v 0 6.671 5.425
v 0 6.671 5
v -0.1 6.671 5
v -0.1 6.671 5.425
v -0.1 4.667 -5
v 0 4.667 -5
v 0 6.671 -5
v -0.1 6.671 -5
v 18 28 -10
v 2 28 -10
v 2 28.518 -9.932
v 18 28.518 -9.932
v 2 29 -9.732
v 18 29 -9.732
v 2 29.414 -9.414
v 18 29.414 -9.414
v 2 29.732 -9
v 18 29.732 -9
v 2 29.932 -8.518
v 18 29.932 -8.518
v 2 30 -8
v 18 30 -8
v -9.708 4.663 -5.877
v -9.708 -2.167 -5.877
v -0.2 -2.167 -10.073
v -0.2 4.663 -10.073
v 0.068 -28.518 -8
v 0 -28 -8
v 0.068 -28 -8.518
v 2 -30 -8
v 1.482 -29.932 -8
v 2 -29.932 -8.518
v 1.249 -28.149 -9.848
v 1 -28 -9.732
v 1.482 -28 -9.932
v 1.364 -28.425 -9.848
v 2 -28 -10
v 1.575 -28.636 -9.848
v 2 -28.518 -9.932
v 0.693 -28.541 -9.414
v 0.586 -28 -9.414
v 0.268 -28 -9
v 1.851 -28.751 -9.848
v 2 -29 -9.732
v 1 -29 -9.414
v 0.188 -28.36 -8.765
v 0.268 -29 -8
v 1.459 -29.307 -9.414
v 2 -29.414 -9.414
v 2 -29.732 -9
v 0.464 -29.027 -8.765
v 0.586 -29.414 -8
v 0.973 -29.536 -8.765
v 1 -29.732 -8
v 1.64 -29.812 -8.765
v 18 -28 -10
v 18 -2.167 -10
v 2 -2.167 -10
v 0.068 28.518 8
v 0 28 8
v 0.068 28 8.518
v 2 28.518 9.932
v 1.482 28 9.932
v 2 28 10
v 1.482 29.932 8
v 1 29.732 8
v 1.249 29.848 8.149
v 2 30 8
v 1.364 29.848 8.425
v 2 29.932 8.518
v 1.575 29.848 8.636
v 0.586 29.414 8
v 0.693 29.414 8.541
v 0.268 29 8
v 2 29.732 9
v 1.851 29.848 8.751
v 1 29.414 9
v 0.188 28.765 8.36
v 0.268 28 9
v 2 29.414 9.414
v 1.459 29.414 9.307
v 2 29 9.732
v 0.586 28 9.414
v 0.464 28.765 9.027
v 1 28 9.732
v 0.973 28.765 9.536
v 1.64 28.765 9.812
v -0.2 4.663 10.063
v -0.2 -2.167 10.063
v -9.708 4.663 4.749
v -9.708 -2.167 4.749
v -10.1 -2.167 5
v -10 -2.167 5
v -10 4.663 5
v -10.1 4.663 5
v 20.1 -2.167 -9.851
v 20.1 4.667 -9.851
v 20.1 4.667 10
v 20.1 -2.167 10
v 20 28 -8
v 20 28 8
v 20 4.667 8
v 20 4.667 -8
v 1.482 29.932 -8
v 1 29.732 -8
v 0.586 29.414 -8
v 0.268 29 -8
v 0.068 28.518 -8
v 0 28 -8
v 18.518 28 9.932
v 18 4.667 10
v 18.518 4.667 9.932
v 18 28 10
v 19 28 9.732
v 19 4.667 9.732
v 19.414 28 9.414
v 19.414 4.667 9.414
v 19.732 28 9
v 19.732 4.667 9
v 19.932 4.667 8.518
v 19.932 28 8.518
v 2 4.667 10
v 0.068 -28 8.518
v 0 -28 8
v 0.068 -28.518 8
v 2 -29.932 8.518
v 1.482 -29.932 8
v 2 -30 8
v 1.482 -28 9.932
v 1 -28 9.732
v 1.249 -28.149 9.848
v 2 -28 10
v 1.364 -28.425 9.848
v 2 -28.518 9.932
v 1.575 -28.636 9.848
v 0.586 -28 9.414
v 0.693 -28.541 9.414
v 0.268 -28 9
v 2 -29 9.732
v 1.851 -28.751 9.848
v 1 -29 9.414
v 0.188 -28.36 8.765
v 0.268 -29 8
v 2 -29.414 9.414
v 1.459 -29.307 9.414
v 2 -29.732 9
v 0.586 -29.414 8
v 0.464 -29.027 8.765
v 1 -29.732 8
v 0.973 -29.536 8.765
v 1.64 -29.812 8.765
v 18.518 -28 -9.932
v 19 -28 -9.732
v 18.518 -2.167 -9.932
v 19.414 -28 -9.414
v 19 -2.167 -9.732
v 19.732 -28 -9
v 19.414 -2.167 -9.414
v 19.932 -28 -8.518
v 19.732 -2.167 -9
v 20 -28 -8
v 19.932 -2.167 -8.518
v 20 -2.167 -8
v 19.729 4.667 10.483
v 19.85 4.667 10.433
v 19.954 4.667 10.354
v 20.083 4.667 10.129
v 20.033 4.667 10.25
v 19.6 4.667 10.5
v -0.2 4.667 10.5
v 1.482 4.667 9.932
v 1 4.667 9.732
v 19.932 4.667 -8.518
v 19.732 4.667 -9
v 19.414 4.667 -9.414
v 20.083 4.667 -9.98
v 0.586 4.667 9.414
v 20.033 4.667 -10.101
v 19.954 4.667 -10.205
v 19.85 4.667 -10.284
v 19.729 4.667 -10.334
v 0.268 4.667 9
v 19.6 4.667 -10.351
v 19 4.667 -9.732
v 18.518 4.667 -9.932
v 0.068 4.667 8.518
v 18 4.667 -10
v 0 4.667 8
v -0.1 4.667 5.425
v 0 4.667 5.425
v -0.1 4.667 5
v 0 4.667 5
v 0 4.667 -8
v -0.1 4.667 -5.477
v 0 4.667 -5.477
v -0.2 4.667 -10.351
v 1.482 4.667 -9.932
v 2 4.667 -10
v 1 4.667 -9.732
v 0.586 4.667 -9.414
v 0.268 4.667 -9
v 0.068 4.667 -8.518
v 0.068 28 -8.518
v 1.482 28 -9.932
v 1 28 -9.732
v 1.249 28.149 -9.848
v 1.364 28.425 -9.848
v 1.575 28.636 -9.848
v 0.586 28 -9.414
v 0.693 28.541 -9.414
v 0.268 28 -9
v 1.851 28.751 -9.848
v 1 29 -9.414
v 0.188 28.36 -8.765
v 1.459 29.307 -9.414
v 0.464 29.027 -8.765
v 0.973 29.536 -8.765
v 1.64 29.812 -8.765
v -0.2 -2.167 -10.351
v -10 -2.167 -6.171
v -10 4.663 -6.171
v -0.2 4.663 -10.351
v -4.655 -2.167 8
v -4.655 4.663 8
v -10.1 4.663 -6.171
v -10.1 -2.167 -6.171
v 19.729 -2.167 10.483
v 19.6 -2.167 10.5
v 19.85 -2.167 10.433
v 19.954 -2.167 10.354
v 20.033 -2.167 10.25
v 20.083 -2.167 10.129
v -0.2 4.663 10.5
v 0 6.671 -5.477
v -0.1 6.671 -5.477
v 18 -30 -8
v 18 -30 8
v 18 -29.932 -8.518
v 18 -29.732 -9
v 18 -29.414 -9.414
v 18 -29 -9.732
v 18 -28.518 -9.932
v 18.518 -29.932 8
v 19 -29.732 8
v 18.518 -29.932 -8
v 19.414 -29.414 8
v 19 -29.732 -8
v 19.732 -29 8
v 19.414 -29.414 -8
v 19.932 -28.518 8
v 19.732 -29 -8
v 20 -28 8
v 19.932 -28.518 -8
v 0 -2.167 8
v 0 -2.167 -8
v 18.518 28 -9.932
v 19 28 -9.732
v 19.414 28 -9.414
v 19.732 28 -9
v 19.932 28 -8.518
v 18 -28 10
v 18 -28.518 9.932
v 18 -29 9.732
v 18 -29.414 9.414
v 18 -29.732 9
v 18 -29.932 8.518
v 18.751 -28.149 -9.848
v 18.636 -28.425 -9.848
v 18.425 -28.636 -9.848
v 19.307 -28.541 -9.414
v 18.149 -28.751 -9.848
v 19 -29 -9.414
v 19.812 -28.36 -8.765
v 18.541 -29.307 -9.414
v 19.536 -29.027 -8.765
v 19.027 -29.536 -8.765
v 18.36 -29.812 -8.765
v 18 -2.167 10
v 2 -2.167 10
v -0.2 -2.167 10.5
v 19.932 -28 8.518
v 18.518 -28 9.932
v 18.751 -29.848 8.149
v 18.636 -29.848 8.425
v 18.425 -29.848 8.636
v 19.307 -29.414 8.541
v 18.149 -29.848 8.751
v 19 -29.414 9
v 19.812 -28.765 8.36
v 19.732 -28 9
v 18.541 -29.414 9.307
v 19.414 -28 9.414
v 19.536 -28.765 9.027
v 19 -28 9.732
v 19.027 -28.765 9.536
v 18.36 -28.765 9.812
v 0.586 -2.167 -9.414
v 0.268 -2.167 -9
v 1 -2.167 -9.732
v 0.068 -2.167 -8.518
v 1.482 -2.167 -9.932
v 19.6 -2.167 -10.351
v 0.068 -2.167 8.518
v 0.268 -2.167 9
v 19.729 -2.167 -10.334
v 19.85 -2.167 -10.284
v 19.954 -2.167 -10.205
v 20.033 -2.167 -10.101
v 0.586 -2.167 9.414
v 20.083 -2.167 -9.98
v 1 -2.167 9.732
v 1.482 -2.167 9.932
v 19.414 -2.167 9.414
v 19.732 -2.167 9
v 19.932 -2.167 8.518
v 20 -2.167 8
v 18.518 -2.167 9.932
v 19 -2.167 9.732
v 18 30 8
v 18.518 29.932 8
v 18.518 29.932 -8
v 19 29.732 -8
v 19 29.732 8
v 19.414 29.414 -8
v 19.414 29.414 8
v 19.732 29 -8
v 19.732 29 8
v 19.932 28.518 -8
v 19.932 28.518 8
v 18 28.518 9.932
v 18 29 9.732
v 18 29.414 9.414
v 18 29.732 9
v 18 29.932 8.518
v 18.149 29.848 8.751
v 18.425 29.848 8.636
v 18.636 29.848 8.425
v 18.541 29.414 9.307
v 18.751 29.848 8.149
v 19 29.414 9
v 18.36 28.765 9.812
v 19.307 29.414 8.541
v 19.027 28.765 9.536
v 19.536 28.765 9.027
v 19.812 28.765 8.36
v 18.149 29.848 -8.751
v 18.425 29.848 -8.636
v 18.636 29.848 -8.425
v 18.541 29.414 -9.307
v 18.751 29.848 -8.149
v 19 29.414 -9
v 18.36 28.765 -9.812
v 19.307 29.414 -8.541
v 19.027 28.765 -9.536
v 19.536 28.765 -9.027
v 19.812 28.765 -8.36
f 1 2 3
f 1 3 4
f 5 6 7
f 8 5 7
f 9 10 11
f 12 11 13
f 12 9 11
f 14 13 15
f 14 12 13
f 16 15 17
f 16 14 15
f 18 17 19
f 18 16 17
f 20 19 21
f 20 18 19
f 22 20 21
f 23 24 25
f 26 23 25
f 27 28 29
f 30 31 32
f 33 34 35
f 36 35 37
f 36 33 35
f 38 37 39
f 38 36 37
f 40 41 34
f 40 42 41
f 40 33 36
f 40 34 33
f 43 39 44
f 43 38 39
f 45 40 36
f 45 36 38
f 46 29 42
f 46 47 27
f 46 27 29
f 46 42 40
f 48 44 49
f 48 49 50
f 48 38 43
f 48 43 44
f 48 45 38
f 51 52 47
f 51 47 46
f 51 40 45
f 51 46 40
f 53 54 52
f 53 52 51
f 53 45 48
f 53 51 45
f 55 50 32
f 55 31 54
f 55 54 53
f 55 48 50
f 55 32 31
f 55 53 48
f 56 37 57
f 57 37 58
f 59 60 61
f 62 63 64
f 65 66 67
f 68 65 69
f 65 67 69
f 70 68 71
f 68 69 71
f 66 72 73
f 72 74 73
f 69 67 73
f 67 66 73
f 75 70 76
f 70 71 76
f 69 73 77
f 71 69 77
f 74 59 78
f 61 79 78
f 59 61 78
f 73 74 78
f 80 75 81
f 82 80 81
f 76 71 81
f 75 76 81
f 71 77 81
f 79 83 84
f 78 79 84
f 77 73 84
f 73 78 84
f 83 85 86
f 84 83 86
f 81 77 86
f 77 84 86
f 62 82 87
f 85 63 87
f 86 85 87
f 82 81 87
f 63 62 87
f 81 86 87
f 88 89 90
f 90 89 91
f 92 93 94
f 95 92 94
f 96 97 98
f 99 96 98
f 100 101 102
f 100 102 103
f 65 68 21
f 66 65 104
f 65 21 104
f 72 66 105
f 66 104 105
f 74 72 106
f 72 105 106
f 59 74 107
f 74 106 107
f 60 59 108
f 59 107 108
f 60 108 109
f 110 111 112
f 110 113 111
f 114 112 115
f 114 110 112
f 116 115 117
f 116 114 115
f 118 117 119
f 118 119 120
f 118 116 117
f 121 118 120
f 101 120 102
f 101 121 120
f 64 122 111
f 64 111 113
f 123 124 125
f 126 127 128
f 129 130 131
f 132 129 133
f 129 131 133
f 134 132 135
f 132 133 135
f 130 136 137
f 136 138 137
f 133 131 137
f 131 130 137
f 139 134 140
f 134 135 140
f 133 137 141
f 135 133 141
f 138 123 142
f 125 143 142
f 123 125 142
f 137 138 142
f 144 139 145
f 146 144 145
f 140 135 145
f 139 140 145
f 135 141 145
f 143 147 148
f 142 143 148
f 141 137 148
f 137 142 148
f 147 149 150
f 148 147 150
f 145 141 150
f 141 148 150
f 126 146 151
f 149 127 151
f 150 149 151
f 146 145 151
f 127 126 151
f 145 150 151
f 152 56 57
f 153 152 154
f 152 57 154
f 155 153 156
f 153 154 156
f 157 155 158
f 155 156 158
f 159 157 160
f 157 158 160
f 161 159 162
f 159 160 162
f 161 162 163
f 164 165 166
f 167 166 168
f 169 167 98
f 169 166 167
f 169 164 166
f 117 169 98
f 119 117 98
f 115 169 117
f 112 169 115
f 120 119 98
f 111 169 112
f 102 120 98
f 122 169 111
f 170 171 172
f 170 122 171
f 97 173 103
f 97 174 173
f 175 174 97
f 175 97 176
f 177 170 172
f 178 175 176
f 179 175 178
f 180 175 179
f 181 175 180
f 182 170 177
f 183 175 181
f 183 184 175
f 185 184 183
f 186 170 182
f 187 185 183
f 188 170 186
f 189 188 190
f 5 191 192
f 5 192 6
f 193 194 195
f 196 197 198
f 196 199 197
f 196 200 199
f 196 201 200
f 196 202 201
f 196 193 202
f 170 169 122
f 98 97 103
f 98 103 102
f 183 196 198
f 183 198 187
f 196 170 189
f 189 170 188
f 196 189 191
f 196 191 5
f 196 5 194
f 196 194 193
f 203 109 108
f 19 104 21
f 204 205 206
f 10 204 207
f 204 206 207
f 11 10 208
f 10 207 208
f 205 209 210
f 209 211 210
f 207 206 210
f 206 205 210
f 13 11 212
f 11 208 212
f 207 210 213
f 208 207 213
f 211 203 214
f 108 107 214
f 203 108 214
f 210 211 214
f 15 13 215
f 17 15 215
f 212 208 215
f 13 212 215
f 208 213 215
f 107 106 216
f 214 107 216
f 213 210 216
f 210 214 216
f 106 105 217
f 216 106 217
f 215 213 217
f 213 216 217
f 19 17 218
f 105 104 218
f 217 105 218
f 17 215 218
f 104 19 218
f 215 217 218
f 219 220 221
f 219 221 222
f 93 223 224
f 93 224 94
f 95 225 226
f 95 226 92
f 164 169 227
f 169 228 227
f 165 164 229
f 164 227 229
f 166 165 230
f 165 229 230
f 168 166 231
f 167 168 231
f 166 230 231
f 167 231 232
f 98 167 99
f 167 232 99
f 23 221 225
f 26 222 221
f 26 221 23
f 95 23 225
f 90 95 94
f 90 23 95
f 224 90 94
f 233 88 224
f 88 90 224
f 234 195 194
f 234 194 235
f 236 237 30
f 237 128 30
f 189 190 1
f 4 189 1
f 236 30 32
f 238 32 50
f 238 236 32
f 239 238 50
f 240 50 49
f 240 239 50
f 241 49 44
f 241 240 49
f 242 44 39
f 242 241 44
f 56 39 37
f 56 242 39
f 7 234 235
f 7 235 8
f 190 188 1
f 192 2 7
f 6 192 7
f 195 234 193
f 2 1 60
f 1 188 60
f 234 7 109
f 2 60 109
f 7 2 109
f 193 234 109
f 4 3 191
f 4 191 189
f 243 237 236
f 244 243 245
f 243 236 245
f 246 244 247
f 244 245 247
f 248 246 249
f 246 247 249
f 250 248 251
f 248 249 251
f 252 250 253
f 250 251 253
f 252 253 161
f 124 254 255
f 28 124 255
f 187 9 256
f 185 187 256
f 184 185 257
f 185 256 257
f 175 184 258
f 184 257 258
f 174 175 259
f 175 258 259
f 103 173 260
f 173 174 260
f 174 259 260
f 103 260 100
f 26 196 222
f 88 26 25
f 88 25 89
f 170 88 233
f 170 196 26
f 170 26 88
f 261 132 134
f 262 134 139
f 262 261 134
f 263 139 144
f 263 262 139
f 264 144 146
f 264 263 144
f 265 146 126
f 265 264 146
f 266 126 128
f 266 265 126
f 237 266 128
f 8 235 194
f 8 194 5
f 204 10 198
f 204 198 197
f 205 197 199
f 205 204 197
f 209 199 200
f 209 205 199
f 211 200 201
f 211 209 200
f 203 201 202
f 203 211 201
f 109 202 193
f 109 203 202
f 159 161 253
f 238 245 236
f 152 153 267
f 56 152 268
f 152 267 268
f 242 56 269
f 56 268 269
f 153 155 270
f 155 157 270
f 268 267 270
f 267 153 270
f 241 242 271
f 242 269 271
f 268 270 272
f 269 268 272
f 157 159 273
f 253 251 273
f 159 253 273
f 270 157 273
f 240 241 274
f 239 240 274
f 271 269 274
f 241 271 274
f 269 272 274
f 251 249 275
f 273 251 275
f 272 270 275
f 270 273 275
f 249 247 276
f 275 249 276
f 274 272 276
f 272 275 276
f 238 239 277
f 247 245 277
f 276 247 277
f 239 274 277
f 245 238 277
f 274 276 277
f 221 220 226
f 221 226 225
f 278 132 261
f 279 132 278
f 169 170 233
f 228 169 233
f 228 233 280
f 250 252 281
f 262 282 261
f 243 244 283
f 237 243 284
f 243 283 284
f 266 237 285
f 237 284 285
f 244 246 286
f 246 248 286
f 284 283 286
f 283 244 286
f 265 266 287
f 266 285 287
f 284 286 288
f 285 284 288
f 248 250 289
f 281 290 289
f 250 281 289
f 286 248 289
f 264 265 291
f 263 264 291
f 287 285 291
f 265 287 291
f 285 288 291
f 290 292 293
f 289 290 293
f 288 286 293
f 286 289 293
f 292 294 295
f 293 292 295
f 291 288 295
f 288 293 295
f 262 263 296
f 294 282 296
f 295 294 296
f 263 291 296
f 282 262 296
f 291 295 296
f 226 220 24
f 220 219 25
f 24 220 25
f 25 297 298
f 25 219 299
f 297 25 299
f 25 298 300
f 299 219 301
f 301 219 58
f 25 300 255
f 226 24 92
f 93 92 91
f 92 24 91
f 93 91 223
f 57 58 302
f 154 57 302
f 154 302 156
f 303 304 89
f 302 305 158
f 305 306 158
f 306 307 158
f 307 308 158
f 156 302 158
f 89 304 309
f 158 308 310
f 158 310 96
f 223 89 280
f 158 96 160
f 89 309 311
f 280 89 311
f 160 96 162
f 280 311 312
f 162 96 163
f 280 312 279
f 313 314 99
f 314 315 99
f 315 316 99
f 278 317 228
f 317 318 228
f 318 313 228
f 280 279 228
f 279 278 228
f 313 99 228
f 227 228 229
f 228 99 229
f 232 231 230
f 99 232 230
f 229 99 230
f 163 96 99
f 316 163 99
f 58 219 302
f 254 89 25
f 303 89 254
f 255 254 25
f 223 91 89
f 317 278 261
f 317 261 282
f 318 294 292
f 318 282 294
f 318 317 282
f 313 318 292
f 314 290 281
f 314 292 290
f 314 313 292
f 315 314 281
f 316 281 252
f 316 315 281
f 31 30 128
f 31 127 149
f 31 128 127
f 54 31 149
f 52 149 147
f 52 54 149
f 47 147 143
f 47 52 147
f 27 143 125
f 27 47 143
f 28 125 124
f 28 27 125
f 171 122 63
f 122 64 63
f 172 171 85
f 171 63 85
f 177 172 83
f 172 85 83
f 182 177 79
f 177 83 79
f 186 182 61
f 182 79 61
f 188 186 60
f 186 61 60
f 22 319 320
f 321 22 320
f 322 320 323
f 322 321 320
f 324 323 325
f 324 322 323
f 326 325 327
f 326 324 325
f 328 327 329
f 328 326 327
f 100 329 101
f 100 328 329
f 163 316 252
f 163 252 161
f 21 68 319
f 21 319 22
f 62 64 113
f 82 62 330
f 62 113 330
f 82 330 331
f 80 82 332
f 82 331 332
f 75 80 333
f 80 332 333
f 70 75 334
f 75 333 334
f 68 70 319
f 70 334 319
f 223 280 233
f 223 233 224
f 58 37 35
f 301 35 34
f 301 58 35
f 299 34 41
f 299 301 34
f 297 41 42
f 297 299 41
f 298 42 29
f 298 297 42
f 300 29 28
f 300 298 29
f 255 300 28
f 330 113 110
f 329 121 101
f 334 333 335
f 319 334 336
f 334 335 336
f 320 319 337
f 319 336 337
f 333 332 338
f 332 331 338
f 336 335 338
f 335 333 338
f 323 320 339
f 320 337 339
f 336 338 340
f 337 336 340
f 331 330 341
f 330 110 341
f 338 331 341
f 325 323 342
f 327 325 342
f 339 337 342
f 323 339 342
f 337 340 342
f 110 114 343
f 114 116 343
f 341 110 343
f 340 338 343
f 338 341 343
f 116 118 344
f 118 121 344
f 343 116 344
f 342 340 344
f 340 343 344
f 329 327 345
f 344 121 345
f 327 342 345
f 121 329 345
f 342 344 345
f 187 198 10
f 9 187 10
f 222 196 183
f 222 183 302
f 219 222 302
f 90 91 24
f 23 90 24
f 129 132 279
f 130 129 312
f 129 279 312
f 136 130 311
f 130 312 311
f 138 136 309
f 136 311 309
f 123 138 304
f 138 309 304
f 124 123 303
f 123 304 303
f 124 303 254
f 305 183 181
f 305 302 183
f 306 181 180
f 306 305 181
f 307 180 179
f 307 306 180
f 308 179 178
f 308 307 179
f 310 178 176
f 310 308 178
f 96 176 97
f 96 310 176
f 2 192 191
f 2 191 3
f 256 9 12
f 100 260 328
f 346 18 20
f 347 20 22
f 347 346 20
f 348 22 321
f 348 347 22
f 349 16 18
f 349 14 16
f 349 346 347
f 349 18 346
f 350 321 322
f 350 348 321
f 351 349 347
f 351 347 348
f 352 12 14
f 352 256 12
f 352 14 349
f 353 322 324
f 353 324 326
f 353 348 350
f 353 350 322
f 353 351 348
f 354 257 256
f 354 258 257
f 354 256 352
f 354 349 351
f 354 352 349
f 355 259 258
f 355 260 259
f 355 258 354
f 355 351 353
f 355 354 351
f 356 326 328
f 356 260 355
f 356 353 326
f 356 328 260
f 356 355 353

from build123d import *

# Parameters (mm, degrees)
SKETCH_1_W           = 20
SKETCH_1_H           = 60
EXTRUDE_1_DEPTH      = 20
FILLET_1_R           = 2
SKETCH_2_W           = 16
SKETCH_2_H           = 1.155895232
EXTRUDE_2_DEPTH      = 0.5
EXTRUDE_3_DEPTH      = 2.1
EXTRUDE_3_DEPTH_BACK = 18.2
SKETCH_4_W           = 0.476897723
SKETCH_4_H           = 2.004187554
SKETCH_4_W_2         = 0.424555406
EXTRUDE_4_DEPTH      = 0.1
EXTRUDE_5_DEPTH      = 6.83
CUT_EXTRUDE_1_DEPTH  = 6.83
SKETCH_7_W           = 11.171140339
SKETCH_7_H           = 6.83
EXTRUDE_6_DEPTH      = 0.1
FILLET_5_R           = 0.5


with BuildPart() as part:
    # 草图1 → 凸台-拉伸1 (new body)
    with BuildSketch(Plane(origin=(0, 0, 0), x_dir=(0, 0, -1), z_dir=(1, 0, 0))):
        Rectangle(SKETCH_1_W, SKETCH_1_H)
    extrude(amount=EXTRUDE_1_DEPTH)

    # 圆角1
    fillet_1_edges = [part.edges().sort_by_distance(p)[0] for p in [
        (20, 0, 10),
        (20, -30, 0),
        (20, 0, -10),
        (0, -30, 0),
        (0, 0, 10),
        (0, 30, 0),
        (0, 0, -10),
        (10, -30, -10),
        (10, -30, 10),
        (10, 30, 10),
        (10, 30, -10),
        (20, 30, 0),
    ]]
    fillet(fillet_1_edges, radius=FILLET_1_R)

    # 草图2 → 凸台-拉伸2 (add)
    with BuildSketch(Plane.XY.offset(10)):
        with Locations((10, 0.577947616)):
            Rectangle(SKETCH_2_W, SKETCH_2_H)
    extrude(amount=EXTRUDE_2_DEPTH)

    # 草图3 → 凸台-拉伸3 (add, two sides: drawn at the far end of the back side and taken through both)
    with BuildSketch(Plane(origin=(18, 0, 0), x_dir=(0, 0, -1), z_dir=(1, 0, 0)).offset(-EXTRUDE_3_DEPTH_BACK)):
        Polygon((-10.5, 1.155895232), (-10.5, 4.667192464), (10.350971517, 4.667192464), (10.350971517, -2.166522321), (-10.5, -2.166522321), align=None)
    extrude(amount=EXTRUDE_3_DEPTH + EXTRUDE_3_DEPTH_BACK)

    # 草图4 → 凸台-拉伸4 (add)
    with BuildSketch(Plane.ZY):
        with Locations((-5.238448862, 5.669286241)):
            Rectangle(SKETCH_4_W, SKETCH_4_H)
        with Locations((5.212277703, 5.669286241)):
            Rectangle(SKETCH_4_W_2, SKETCH_4_H)
    extrude(amount=EXTRUDE_4_DEPTH)

    # 草图5 → 凸台-拉伸5 (add)
    with BuildSketch(Plane.XZ.offset(2.166522321)):
        Polygon((-0.2, -10.350971517), (-0.2, 8), (-4.654545455, 8), (-10, 5), (-10, 0), (-10, -6.171140339), align=None)
        Polygon((-4.654545455, 8), (-0.2, 8), (-0.2, 10.5), align=None)
    extrude(amount=-EXTRUDE_5_DEPTH)

    # 草图6 → 切除-拉伸1 (cut)
    with BuildSketch(Plane.XZ.offset(2.166522321)):
        Polygon((-9.707704369, -5.877282194), (-0.2, -10.073184662), (-0.2, 10.062586421), (-9.707704369, 4.749296883), align=None)
    extrude(amount=-CUT_EXTRUDE_1_DEPTH, mode=Mode.SUBTRACT)

    # 草图7 → 凸台-拉伸6 (add)
    with BuildSketch(Plane.ZY.offset(10)):
        with Locations((-0.58557017, 1.248477679)):
            Rectangle(SKETCH_7_W, SKETCH_7_H)
    extrude(amount=EXTRUDE_6_DEPTH)

    # 圆角5
    fillet_5_edges = [part.edges().sort_by_distance(p)[0] for p in [
        (20.1, 1.250335071, 10.5),
        (20.1, 1.250335071, -10.350971517),
    ]]
    fillet(fillet_5_edges, radius=FILLET_5_R)


solid = part.part
